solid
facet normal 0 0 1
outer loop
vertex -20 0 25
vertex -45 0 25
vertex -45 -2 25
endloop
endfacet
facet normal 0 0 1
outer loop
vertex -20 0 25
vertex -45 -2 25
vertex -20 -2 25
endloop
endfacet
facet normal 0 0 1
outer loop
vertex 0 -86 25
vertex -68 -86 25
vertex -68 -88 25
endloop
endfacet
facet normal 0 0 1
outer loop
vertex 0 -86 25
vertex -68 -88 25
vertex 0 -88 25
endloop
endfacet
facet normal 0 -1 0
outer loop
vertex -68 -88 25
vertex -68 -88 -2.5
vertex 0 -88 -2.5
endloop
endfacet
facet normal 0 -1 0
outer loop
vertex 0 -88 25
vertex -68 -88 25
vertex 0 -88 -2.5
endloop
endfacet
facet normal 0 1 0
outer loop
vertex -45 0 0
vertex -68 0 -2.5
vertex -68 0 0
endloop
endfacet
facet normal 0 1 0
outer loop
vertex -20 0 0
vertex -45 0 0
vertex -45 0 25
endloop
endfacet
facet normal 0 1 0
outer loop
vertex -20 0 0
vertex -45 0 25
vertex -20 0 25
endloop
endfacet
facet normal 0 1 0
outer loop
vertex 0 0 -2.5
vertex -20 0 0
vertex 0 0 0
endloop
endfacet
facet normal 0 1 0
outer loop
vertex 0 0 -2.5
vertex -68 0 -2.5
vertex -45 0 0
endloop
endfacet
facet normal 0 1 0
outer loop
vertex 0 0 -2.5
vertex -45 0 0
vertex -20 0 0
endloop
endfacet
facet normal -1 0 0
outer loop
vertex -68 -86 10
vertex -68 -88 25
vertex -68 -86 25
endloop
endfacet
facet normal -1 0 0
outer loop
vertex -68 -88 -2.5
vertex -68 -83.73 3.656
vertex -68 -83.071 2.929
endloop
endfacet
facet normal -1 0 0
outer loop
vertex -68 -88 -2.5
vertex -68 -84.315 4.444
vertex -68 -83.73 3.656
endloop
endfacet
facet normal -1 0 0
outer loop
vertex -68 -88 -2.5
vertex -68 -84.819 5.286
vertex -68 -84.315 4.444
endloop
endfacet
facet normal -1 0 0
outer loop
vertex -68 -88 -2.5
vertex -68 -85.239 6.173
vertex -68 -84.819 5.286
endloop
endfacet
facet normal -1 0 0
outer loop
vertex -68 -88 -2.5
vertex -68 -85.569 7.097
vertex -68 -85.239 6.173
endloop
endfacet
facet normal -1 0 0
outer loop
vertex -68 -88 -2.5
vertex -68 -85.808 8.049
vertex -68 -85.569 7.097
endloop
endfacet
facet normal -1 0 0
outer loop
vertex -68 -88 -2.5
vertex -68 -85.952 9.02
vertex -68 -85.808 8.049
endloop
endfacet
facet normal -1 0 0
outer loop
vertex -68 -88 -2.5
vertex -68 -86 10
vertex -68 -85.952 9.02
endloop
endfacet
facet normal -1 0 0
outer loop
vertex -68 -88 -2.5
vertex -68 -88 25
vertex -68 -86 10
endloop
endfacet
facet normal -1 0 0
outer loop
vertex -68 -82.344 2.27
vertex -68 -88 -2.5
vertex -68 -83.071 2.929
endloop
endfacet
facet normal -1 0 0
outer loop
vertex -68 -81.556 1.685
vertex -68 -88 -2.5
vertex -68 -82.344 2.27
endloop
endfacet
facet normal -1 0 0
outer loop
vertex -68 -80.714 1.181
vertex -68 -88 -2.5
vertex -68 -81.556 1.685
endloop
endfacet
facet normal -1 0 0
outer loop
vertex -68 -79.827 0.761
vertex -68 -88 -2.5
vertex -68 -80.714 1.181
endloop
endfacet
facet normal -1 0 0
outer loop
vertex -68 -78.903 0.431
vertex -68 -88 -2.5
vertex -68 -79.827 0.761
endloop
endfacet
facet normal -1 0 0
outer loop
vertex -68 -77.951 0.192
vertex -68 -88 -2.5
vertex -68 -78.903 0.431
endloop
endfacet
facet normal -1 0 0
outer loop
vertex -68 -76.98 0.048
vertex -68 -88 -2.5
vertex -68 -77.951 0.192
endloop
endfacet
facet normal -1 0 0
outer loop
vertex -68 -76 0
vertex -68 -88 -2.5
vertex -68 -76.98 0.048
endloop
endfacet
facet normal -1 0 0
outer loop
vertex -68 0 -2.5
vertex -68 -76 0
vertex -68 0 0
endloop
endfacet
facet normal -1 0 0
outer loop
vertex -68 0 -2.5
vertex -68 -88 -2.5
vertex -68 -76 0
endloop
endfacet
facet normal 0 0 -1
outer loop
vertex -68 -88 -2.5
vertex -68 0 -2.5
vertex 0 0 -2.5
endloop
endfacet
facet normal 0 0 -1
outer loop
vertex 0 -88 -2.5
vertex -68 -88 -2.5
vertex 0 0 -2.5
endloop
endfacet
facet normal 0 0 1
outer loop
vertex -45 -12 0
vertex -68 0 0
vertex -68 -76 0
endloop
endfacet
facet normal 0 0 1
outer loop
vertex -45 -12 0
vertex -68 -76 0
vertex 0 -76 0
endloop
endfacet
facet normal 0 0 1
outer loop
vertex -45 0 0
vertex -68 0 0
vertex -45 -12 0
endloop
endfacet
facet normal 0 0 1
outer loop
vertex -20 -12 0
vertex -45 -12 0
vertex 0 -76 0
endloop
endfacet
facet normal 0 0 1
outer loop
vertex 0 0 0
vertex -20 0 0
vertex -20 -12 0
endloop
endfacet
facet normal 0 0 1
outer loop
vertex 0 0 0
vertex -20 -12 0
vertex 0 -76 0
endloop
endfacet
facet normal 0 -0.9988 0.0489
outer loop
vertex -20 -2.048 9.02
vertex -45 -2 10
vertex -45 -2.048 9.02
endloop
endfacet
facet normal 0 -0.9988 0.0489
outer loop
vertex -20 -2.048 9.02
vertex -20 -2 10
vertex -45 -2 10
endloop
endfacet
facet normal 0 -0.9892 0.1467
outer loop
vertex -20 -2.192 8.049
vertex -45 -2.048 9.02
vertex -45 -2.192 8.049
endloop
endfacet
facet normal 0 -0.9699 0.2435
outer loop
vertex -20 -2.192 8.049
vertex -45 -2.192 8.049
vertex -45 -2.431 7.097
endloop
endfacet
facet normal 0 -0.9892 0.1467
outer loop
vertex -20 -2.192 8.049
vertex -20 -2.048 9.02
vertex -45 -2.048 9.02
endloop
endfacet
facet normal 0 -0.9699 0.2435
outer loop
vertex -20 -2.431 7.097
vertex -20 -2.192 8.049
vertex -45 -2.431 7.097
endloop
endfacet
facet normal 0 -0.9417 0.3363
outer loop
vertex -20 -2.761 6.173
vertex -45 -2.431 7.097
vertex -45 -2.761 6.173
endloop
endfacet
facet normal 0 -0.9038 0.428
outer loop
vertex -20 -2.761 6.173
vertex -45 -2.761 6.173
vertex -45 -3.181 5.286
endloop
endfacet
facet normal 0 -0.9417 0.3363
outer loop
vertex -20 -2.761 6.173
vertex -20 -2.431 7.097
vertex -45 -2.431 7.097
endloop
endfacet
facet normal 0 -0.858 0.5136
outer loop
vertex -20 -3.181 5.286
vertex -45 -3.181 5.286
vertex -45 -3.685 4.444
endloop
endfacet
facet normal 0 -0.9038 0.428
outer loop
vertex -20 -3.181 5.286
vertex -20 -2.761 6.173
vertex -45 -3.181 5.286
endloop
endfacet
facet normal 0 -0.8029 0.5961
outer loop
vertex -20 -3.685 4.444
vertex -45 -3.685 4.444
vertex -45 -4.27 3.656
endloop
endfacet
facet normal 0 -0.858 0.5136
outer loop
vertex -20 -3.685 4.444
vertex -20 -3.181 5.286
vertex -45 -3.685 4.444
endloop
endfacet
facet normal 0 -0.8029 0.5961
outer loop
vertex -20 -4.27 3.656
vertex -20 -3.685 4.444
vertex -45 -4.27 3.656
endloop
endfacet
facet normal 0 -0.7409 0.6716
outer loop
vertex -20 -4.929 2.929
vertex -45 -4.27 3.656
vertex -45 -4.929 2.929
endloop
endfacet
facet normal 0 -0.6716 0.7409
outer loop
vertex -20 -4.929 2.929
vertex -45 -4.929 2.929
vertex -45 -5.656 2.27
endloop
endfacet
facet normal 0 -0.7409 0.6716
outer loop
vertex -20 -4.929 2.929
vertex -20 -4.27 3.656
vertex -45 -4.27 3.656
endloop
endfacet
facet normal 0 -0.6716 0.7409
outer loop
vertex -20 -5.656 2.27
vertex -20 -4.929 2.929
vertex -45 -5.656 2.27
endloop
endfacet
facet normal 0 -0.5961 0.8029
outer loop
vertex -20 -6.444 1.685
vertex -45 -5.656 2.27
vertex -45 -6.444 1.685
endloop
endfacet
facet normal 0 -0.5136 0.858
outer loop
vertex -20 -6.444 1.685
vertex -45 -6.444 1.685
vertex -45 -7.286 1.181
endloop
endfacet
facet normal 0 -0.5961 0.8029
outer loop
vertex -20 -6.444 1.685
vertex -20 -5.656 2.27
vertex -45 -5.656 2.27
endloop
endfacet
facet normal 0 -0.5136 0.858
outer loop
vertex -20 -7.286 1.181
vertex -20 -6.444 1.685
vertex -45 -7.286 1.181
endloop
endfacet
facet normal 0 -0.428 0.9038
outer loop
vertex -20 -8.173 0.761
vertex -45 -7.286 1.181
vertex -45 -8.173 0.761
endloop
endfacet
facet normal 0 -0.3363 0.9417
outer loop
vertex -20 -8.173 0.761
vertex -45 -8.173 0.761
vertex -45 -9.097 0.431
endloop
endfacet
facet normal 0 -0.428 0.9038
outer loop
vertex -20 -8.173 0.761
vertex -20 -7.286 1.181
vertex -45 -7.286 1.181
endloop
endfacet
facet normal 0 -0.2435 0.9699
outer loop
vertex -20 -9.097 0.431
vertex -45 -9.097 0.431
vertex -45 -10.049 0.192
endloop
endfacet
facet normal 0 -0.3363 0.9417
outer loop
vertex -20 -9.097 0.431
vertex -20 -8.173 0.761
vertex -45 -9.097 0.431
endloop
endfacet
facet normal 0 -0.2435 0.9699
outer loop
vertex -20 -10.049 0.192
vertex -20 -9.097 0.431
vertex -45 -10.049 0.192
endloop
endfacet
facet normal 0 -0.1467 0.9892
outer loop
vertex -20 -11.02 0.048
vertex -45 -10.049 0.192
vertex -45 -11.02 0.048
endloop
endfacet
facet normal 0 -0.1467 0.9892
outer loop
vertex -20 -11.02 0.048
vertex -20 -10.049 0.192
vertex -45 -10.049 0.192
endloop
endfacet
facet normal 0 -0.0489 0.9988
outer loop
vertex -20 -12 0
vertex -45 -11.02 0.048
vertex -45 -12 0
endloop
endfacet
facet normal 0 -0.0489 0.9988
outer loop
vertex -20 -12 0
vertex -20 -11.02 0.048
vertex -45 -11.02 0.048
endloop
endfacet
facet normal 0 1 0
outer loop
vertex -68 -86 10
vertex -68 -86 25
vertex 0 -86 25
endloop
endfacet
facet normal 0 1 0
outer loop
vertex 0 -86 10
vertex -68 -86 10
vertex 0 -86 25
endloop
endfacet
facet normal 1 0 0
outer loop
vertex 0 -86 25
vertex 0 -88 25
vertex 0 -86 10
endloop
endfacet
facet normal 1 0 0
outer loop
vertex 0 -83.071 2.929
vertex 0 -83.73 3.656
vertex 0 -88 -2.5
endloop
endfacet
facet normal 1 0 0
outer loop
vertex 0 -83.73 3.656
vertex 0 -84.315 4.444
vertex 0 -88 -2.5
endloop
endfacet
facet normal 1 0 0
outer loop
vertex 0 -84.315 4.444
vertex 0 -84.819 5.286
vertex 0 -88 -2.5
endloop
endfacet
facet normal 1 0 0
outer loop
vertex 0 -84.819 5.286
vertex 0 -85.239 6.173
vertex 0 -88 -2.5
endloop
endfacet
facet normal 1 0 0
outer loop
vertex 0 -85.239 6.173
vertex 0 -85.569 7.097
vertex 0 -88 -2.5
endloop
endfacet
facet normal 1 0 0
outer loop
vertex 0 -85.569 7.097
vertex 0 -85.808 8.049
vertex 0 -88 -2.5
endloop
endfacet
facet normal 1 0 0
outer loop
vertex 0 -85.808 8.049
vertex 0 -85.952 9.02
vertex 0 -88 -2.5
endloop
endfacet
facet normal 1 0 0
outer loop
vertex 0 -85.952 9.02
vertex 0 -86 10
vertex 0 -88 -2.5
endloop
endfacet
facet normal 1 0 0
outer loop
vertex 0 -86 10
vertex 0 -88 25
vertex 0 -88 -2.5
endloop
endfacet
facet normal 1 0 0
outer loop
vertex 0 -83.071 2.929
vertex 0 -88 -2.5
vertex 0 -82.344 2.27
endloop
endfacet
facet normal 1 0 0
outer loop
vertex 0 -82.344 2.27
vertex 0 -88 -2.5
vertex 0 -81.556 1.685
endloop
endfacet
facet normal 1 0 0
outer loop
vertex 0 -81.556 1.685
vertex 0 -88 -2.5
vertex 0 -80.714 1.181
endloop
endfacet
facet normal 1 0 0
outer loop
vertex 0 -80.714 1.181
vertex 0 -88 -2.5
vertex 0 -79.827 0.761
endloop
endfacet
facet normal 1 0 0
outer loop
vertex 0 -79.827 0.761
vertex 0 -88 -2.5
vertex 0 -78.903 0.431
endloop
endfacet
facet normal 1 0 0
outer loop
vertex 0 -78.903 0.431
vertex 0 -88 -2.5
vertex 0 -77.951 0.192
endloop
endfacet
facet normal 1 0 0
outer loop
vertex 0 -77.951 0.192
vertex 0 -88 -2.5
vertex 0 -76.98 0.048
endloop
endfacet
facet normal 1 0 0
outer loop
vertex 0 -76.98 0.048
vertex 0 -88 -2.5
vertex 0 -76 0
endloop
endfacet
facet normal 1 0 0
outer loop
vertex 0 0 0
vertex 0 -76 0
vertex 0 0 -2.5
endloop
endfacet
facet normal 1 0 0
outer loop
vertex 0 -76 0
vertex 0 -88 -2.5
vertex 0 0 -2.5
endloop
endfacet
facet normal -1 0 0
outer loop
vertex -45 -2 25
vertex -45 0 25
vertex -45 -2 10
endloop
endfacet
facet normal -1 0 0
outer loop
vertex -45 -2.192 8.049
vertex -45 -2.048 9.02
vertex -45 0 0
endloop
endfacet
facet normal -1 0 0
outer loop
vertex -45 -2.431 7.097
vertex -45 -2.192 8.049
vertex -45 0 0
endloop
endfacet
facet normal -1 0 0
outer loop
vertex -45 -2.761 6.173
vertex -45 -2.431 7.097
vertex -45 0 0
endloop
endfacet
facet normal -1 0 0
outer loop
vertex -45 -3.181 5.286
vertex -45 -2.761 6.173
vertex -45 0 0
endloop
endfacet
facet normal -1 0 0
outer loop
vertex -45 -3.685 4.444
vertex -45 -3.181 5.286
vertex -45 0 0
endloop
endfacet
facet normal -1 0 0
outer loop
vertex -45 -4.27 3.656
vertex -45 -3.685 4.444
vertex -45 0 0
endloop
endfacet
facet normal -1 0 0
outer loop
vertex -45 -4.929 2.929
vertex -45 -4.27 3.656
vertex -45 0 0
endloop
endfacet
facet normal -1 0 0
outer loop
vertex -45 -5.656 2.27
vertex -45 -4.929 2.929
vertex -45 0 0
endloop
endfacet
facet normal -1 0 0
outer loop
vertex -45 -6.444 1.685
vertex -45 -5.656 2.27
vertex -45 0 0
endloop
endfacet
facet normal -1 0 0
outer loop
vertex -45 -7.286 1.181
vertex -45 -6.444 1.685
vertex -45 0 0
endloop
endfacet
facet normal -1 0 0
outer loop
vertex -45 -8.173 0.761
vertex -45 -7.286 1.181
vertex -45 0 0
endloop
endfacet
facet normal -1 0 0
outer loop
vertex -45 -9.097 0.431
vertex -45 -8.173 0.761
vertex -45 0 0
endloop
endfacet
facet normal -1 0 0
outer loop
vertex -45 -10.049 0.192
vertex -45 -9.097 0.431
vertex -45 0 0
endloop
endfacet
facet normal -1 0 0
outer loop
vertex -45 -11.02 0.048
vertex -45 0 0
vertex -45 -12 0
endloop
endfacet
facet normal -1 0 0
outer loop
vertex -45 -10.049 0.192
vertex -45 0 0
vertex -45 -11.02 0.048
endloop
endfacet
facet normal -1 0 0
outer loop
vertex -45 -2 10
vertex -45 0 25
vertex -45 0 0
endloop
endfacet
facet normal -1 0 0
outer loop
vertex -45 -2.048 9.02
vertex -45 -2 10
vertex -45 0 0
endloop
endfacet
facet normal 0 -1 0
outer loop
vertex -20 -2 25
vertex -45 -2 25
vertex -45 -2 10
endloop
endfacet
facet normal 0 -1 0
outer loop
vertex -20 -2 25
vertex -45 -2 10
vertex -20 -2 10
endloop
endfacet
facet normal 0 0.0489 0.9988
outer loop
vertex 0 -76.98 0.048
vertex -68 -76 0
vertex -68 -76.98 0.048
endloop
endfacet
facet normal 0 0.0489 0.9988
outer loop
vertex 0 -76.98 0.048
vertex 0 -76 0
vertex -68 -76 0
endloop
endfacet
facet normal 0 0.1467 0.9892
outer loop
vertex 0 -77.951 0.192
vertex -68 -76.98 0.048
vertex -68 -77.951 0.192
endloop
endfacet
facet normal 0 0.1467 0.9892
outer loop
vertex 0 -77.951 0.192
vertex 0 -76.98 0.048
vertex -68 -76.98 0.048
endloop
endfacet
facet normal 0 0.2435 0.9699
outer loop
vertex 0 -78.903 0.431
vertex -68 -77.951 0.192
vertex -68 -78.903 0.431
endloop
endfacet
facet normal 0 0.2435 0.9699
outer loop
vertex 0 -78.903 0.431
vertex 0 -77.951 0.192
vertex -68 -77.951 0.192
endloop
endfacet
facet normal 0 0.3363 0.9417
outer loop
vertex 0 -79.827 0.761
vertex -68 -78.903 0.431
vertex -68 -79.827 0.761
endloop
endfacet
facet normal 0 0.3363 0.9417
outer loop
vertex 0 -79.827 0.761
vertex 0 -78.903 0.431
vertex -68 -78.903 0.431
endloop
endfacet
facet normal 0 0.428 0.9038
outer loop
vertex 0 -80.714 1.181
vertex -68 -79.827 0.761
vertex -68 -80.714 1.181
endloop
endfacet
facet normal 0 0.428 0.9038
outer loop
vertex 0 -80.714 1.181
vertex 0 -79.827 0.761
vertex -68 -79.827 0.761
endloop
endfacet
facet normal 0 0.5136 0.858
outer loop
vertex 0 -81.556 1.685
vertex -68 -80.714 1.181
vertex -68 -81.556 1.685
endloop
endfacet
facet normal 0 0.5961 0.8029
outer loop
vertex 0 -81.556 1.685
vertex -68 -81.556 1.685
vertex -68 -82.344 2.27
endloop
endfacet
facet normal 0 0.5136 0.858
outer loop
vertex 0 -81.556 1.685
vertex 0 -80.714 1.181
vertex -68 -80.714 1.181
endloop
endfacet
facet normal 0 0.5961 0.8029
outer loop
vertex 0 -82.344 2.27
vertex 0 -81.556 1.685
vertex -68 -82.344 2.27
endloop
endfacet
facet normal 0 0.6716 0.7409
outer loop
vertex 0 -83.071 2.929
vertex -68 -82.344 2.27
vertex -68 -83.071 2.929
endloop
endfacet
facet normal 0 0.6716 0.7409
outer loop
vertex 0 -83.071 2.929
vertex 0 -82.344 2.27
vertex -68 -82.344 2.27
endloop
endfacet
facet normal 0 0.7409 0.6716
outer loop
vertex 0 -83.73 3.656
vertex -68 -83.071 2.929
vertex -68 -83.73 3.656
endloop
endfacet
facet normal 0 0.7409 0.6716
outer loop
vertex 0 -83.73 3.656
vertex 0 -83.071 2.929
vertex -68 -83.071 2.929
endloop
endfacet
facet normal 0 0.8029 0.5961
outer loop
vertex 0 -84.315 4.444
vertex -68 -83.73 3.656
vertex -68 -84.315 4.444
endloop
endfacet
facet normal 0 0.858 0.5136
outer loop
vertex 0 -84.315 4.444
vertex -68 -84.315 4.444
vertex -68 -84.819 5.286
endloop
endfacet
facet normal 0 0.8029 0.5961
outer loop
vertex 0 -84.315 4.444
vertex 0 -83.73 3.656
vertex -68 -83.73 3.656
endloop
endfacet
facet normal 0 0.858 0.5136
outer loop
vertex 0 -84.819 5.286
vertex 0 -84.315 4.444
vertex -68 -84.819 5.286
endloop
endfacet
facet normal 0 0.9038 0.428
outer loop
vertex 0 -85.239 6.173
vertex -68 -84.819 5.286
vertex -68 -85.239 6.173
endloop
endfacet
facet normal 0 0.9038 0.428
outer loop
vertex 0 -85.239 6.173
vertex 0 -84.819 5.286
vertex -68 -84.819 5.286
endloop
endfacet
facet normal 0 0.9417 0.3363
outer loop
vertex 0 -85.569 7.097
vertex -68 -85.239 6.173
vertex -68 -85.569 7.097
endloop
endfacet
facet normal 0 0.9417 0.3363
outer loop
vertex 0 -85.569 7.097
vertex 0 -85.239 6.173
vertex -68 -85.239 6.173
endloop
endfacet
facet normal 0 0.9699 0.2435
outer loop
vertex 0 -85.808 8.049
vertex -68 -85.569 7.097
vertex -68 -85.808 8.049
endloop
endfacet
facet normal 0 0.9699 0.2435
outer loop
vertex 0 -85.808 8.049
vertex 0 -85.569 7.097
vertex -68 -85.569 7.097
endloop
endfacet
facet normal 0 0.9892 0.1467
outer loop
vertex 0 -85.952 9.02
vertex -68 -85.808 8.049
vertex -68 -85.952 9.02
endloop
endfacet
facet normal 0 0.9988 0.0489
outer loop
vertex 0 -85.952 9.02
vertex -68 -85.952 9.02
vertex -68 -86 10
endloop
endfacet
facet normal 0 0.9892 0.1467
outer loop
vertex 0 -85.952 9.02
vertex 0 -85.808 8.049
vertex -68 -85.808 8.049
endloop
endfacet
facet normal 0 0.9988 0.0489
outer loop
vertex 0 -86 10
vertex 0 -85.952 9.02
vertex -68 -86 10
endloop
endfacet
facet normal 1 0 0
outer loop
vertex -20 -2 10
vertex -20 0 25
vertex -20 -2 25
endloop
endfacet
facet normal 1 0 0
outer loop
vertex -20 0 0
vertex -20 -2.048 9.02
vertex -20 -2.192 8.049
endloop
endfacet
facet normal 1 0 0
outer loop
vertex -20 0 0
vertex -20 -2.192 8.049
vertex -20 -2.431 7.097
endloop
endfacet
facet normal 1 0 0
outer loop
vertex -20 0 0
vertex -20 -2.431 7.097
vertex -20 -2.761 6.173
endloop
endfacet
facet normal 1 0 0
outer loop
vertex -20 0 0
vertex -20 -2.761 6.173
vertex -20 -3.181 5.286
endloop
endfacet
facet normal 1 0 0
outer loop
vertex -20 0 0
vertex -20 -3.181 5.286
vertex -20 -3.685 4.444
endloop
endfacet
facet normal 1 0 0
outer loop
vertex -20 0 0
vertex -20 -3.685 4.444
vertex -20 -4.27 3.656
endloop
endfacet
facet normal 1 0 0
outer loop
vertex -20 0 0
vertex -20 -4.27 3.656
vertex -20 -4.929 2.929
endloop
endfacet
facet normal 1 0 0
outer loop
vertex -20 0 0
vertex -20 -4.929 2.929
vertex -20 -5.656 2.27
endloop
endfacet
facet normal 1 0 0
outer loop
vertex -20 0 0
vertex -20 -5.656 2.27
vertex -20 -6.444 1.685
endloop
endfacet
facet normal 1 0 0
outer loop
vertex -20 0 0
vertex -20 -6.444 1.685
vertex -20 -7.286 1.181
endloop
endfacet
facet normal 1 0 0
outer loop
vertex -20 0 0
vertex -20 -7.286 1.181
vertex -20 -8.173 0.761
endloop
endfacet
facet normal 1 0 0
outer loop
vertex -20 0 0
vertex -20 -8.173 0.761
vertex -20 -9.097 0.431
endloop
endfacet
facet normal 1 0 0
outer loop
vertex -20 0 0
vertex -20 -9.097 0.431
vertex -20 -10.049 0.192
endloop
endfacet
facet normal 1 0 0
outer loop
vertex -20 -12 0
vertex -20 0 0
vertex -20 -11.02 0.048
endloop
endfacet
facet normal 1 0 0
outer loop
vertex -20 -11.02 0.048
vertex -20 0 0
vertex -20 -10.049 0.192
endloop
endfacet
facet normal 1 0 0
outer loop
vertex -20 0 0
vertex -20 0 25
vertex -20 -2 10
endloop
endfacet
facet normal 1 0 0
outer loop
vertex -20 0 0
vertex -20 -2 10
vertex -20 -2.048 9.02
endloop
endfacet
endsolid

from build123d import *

# Parameters (mm, degrees)
BOSS_EXTRUDE1_DEPTH      = 25
BOSS_EXTRUDE1_DEPTH_BACK = 2.5
SKETCH1_W                = 68
SKETCH1_H                = 88
SKETCH2_W                = 82.510400987
SKETCH2_H                = 84
CUT_EXTRUDE1_DEPTH       = 25
SKETCH3_W                = 23
SKETCH3_H                = 25
CUT_EXTRUDE2_DEPTH       = 25
SKETCH4_W                = 20
SKETCH4_H                = 25
CUT_EXTRUDE3_DEPTH       = 25
FILLET2_R                = 10


with BuildPart() as part:
    # Sketch1 → Boss-Extrude1 (new, two sides: drawn at the far end of the back side and taken through both)
    with BuildSketch(Plane.XY.offset(-BOSS_EXTRUDE1_DEPTH_BACK)):
        with Locations((-34, -44)):
            Rectangle(SKETCH1_W, SKETCH1_H)
    extrude(amount=BOSS_EXTRUDE1_DEPTH + BOSS_EXTRUDE1_DEPTH_BACK)

    # Sketch2 → Cut-Extrude1 (cut)
    with BuildSketch(Plane.XY.offset(25)):
        with Locations((-33.923509309, -44)):
            Rectangle(SKETCH2_W, SKETCH2_H)
    extrude(amount=-CUT_EXTRUDE1_DEPTH, mode=Mode.SUBTRACT)

    # Sketch3 → Cut-Extrude2 (cut)
    with BuildSketch(Plane(origin=(0, 0, 0), x_dir=(1, 0, 0), z_dir=(0, 1, 0))):
        with Locations((-56.5, -12.5)):
            Rectangle(SKETCH3_W, SKETCH3_H)
    extrude(amount=-CUT_EXTRUDE2_DEPTH, mode=Mode.SUBTRACT)

    # Sketch4 → Cut-Extrude3 (cut)
    with BuildSketch(Plane(origin=(0, 0, 0), x_dir=(1, 0, 0), z_dir=(0, 1, 0))):
        with Locations((-10, -12.5)):
            Rectangle(SKETCH4_W, SKETCH4_H)
    extrude(amount=-CUT_EXTRUDE3_DEPTH, mode=Mode.SUBTRACT)

    # Fillet2
    fillet2_edges = [part.edges().sort_by_distance(p)[0] for p in [
        (-34, -86, 0),
        (-32.5, -2, 0),
    ]]
    fillet(fillet2_edges, radius=FILLET2_R)


solid = part.part
